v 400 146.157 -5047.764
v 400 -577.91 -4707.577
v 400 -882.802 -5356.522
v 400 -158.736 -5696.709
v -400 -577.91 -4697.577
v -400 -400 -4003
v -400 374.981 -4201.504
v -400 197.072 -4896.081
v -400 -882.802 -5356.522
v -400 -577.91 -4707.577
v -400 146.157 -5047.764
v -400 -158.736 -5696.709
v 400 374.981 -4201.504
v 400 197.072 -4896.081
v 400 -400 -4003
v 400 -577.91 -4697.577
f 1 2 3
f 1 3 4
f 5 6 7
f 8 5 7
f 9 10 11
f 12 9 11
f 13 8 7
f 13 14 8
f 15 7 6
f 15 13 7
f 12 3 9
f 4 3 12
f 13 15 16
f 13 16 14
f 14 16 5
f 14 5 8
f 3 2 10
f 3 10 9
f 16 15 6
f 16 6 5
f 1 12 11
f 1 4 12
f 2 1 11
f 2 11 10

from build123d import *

# Parameters (mm, degrees)
F2_DEPTH = 400


# Not quite as in the source:
# - the program builds the solid bodies; features that only make, move or delete a surface that nothing else refers to are left out


with BuildPart() as f2:
    # F1 (on Right) → F2 (new body, symmetric)
    with BuildSketch(Plane.YZ):
        Polygon((374.981304402, -4201.5043521622), (-400, -4003), (-577.9095256254, -4697.5769940703), (197.0717787767, -4896.0813462325), (286.0265415893, -4548.7928491974), align=None)
    extrude(amount=F2_DEPTH, both=True)


with BuildPart() as f2b:
    # F1 (on Right) → F2, piece 2 (new body, symmetric)
    with BuildSketch(Plane.YZ):
        Polygon((-158.7356341258, -5696.709062444), (-6.28921634, -5372.2366603752), (146.1572014458, -5047.7642583064), (-577.9095256254, -4707.5769940703), (-882.802361197, -5356.5217982079), align=None)
    extrude(amount=F2_DEPTH, both=True)


solid = Compound([f2.part, f2b.part])
